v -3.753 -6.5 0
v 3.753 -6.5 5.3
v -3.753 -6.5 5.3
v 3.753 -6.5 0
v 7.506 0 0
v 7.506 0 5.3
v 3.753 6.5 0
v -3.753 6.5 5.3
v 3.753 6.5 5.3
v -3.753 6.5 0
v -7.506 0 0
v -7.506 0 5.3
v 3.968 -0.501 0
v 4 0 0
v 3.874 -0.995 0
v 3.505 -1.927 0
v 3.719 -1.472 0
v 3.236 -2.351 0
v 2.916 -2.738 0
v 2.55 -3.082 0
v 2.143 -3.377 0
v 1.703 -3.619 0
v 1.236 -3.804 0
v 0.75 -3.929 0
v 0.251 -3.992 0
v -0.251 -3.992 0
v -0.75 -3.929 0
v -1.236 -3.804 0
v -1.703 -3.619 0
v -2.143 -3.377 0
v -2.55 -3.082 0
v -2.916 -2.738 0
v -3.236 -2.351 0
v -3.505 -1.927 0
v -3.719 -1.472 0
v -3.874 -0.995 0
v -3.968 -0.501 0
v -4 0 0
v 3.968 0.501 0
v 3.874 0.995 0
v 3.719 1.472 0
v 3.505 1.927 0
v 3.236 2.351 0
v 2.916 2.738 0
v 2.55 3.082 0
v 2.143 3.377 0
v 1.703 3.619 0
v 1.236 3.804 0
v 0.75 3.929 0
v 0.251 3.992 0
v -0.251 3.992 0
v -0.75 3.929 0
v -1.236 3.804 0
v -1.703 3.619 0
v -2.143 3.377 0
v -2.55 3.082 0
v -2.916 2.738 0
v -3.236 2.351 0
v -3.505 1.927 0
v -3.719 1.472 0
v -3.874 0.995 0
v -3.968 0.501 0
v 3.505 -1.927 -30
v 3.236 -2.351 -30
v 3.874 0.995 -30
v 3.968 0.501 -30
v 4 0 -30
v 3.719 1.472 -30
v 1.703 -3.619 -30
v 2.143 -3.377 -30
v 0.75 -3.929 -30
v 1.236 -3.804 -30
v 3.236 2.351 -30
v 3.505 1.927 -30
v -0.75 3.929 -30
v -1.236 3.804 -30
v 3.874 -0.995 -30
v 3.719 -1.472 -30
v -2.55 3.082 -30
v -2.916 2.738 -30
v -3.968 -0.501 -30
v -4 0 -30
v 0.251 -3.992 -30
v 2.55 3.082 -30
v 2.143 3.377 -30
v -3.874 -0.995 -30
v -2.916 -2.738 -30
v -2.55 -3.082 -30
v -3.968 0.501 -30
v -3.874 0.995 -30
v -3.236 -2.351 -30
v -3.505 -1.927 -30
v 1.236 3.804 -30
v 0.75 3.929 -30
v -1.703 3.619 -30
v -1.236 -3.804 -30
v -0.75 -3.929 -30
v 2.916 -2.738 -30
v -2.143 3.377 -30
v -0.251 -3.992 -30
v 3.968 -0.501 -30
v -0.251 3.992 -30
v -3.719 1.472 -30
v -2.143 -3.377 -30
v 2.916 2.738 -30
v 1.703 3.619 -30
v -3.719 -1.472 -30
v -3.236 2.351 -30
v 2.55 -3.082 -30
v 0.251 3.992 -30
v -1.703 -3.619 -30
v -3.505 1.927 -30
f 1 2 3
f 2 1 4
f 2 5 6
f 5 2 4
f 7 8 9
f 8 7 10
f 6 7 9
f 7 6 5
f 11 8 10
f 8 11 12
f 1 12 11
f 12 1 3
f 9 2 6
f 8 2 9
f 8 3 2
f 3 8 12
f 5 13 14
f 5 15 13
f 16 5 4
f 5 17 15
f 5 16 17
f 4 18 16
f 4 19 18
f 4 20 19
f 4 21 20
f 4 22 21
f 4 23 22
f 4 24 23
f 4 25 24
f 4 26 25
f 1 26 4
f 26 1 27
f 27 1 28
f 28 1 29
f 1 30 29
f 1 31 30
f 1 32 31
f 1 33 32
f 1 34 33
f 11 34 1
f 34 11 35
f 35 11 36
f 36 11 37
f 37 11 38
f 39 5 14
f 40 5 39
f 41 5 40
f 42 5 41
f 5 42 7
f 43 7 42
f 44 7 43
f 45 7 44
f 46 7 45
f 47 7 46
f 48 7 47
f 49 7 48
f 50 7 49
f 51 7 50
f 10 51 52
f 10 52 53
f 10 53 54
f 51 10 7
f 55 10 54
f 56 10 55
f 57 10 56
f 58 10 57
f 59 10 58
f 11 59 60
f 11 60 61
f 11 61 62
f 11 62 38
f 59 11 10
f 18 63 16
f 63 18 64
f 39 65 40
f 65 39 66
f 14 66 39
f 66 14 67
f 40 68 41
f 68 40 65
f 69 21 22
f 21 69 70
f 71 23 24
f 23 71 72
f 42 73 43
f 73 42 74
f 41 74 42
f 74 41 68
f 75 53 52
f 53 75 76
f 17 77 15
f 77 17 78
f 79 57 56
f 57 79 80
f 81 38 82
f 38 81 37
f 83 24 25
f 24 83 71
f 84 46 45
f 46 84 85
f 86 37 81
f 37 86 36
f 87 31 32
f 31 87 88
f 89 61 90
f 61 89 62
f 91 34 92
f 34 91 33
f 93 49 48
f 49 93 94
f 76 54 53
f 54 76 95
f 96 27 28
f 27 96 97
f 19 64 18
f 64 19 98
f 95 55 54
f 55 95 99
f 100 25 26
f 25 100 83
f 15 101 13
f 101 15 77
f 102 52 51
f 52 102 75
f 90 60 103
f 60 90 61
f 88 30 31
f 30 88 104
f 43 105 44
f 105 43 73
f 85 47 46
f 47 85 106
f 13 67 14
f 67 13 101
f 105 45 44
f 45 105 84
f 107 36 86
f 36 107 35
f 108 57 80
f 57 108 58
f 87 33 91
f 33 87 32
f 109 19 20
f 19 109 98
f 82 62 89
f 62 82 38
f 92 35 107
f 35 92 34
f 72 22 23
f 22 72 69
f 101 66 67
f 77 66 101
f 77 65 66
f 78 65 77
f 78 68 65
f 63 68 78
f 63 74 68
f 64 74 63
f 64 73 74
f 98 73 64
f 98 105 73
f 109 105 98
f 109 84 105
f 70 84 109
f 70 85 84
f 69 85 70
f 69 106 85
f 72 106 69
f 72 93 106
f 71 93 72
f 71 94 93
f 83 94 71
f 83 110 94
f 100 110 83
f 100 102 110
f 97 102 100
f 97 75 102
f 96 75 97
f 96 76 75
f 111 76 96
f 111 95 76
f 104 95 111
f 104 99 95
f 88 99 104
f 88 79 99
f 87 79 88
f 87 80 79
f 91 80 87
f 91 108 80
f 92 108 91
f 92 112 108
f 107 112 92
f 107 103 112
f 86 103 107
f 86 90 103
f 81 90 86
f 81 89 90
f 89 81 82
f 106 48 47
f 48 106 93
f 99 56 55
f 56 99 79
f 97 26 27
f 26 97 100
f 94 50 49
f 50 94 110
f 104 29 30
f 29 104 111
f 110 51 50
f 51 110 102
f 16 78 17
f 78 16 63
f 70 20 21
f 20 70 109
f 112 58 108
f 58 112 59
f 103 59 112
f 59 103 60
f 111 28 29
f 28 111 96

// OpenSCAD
// M8 Bolt (Simplified)
// Dimensions:
// Head: Hexagonal, across-flats 13mm, height 5.3mm
// Shank: Diameter 8mm, length 30mm

$fn = 50; // Smoothness for cylinders

// Parameters
head_across_flats = 13;
head_height = 5.3;
shank_diameter = 8;
shank_length = 30;

// Calculate circumradius for the hexagon based on across-flats distance
// circumradius = (across_flats / 2) / cos(30)
hex_radius = (head_across_flats / 2) / cos(30);

module m8_bolt() {
    // Head: Positioned at z=0, extending to z=5.3
    translate([0, 0, 0])
    cylinder(h = head_height, r = hex_radius, $fn = 6);

    // Shank: Positioned with bottom at z=0, extending to z=-30
    translate([0, 0, -shank_length])
    cylinder(h = shank_length, d = shank_diameter);
}

// Rotate or reorient if needed, but following prompt:
// "Head bottom at origin, shank extends to z < 0"
// To align with "center axis is +Z direction" while "shank is z < 0",
// we must interpret that the bolt axis is the Z axis, but the geometry
// placement is as requested.
// The prompt says: "Center axis is +Z direction" AND "Shank is z < 0".
// This implies the bolt points "down" relative to the head.

// Since the prompt asks for the Shank to be z < 0 and Head bottom at z=0:
// The axial direction of the bolt (from head to tip) is -Z.
// To make the "axis" +Z, we can rotate the whole object 180 deg, 
// but the prompt specifically dictates the Z coordinates.
// I will follow the specific coordinate instructions.

m8_bolt();
